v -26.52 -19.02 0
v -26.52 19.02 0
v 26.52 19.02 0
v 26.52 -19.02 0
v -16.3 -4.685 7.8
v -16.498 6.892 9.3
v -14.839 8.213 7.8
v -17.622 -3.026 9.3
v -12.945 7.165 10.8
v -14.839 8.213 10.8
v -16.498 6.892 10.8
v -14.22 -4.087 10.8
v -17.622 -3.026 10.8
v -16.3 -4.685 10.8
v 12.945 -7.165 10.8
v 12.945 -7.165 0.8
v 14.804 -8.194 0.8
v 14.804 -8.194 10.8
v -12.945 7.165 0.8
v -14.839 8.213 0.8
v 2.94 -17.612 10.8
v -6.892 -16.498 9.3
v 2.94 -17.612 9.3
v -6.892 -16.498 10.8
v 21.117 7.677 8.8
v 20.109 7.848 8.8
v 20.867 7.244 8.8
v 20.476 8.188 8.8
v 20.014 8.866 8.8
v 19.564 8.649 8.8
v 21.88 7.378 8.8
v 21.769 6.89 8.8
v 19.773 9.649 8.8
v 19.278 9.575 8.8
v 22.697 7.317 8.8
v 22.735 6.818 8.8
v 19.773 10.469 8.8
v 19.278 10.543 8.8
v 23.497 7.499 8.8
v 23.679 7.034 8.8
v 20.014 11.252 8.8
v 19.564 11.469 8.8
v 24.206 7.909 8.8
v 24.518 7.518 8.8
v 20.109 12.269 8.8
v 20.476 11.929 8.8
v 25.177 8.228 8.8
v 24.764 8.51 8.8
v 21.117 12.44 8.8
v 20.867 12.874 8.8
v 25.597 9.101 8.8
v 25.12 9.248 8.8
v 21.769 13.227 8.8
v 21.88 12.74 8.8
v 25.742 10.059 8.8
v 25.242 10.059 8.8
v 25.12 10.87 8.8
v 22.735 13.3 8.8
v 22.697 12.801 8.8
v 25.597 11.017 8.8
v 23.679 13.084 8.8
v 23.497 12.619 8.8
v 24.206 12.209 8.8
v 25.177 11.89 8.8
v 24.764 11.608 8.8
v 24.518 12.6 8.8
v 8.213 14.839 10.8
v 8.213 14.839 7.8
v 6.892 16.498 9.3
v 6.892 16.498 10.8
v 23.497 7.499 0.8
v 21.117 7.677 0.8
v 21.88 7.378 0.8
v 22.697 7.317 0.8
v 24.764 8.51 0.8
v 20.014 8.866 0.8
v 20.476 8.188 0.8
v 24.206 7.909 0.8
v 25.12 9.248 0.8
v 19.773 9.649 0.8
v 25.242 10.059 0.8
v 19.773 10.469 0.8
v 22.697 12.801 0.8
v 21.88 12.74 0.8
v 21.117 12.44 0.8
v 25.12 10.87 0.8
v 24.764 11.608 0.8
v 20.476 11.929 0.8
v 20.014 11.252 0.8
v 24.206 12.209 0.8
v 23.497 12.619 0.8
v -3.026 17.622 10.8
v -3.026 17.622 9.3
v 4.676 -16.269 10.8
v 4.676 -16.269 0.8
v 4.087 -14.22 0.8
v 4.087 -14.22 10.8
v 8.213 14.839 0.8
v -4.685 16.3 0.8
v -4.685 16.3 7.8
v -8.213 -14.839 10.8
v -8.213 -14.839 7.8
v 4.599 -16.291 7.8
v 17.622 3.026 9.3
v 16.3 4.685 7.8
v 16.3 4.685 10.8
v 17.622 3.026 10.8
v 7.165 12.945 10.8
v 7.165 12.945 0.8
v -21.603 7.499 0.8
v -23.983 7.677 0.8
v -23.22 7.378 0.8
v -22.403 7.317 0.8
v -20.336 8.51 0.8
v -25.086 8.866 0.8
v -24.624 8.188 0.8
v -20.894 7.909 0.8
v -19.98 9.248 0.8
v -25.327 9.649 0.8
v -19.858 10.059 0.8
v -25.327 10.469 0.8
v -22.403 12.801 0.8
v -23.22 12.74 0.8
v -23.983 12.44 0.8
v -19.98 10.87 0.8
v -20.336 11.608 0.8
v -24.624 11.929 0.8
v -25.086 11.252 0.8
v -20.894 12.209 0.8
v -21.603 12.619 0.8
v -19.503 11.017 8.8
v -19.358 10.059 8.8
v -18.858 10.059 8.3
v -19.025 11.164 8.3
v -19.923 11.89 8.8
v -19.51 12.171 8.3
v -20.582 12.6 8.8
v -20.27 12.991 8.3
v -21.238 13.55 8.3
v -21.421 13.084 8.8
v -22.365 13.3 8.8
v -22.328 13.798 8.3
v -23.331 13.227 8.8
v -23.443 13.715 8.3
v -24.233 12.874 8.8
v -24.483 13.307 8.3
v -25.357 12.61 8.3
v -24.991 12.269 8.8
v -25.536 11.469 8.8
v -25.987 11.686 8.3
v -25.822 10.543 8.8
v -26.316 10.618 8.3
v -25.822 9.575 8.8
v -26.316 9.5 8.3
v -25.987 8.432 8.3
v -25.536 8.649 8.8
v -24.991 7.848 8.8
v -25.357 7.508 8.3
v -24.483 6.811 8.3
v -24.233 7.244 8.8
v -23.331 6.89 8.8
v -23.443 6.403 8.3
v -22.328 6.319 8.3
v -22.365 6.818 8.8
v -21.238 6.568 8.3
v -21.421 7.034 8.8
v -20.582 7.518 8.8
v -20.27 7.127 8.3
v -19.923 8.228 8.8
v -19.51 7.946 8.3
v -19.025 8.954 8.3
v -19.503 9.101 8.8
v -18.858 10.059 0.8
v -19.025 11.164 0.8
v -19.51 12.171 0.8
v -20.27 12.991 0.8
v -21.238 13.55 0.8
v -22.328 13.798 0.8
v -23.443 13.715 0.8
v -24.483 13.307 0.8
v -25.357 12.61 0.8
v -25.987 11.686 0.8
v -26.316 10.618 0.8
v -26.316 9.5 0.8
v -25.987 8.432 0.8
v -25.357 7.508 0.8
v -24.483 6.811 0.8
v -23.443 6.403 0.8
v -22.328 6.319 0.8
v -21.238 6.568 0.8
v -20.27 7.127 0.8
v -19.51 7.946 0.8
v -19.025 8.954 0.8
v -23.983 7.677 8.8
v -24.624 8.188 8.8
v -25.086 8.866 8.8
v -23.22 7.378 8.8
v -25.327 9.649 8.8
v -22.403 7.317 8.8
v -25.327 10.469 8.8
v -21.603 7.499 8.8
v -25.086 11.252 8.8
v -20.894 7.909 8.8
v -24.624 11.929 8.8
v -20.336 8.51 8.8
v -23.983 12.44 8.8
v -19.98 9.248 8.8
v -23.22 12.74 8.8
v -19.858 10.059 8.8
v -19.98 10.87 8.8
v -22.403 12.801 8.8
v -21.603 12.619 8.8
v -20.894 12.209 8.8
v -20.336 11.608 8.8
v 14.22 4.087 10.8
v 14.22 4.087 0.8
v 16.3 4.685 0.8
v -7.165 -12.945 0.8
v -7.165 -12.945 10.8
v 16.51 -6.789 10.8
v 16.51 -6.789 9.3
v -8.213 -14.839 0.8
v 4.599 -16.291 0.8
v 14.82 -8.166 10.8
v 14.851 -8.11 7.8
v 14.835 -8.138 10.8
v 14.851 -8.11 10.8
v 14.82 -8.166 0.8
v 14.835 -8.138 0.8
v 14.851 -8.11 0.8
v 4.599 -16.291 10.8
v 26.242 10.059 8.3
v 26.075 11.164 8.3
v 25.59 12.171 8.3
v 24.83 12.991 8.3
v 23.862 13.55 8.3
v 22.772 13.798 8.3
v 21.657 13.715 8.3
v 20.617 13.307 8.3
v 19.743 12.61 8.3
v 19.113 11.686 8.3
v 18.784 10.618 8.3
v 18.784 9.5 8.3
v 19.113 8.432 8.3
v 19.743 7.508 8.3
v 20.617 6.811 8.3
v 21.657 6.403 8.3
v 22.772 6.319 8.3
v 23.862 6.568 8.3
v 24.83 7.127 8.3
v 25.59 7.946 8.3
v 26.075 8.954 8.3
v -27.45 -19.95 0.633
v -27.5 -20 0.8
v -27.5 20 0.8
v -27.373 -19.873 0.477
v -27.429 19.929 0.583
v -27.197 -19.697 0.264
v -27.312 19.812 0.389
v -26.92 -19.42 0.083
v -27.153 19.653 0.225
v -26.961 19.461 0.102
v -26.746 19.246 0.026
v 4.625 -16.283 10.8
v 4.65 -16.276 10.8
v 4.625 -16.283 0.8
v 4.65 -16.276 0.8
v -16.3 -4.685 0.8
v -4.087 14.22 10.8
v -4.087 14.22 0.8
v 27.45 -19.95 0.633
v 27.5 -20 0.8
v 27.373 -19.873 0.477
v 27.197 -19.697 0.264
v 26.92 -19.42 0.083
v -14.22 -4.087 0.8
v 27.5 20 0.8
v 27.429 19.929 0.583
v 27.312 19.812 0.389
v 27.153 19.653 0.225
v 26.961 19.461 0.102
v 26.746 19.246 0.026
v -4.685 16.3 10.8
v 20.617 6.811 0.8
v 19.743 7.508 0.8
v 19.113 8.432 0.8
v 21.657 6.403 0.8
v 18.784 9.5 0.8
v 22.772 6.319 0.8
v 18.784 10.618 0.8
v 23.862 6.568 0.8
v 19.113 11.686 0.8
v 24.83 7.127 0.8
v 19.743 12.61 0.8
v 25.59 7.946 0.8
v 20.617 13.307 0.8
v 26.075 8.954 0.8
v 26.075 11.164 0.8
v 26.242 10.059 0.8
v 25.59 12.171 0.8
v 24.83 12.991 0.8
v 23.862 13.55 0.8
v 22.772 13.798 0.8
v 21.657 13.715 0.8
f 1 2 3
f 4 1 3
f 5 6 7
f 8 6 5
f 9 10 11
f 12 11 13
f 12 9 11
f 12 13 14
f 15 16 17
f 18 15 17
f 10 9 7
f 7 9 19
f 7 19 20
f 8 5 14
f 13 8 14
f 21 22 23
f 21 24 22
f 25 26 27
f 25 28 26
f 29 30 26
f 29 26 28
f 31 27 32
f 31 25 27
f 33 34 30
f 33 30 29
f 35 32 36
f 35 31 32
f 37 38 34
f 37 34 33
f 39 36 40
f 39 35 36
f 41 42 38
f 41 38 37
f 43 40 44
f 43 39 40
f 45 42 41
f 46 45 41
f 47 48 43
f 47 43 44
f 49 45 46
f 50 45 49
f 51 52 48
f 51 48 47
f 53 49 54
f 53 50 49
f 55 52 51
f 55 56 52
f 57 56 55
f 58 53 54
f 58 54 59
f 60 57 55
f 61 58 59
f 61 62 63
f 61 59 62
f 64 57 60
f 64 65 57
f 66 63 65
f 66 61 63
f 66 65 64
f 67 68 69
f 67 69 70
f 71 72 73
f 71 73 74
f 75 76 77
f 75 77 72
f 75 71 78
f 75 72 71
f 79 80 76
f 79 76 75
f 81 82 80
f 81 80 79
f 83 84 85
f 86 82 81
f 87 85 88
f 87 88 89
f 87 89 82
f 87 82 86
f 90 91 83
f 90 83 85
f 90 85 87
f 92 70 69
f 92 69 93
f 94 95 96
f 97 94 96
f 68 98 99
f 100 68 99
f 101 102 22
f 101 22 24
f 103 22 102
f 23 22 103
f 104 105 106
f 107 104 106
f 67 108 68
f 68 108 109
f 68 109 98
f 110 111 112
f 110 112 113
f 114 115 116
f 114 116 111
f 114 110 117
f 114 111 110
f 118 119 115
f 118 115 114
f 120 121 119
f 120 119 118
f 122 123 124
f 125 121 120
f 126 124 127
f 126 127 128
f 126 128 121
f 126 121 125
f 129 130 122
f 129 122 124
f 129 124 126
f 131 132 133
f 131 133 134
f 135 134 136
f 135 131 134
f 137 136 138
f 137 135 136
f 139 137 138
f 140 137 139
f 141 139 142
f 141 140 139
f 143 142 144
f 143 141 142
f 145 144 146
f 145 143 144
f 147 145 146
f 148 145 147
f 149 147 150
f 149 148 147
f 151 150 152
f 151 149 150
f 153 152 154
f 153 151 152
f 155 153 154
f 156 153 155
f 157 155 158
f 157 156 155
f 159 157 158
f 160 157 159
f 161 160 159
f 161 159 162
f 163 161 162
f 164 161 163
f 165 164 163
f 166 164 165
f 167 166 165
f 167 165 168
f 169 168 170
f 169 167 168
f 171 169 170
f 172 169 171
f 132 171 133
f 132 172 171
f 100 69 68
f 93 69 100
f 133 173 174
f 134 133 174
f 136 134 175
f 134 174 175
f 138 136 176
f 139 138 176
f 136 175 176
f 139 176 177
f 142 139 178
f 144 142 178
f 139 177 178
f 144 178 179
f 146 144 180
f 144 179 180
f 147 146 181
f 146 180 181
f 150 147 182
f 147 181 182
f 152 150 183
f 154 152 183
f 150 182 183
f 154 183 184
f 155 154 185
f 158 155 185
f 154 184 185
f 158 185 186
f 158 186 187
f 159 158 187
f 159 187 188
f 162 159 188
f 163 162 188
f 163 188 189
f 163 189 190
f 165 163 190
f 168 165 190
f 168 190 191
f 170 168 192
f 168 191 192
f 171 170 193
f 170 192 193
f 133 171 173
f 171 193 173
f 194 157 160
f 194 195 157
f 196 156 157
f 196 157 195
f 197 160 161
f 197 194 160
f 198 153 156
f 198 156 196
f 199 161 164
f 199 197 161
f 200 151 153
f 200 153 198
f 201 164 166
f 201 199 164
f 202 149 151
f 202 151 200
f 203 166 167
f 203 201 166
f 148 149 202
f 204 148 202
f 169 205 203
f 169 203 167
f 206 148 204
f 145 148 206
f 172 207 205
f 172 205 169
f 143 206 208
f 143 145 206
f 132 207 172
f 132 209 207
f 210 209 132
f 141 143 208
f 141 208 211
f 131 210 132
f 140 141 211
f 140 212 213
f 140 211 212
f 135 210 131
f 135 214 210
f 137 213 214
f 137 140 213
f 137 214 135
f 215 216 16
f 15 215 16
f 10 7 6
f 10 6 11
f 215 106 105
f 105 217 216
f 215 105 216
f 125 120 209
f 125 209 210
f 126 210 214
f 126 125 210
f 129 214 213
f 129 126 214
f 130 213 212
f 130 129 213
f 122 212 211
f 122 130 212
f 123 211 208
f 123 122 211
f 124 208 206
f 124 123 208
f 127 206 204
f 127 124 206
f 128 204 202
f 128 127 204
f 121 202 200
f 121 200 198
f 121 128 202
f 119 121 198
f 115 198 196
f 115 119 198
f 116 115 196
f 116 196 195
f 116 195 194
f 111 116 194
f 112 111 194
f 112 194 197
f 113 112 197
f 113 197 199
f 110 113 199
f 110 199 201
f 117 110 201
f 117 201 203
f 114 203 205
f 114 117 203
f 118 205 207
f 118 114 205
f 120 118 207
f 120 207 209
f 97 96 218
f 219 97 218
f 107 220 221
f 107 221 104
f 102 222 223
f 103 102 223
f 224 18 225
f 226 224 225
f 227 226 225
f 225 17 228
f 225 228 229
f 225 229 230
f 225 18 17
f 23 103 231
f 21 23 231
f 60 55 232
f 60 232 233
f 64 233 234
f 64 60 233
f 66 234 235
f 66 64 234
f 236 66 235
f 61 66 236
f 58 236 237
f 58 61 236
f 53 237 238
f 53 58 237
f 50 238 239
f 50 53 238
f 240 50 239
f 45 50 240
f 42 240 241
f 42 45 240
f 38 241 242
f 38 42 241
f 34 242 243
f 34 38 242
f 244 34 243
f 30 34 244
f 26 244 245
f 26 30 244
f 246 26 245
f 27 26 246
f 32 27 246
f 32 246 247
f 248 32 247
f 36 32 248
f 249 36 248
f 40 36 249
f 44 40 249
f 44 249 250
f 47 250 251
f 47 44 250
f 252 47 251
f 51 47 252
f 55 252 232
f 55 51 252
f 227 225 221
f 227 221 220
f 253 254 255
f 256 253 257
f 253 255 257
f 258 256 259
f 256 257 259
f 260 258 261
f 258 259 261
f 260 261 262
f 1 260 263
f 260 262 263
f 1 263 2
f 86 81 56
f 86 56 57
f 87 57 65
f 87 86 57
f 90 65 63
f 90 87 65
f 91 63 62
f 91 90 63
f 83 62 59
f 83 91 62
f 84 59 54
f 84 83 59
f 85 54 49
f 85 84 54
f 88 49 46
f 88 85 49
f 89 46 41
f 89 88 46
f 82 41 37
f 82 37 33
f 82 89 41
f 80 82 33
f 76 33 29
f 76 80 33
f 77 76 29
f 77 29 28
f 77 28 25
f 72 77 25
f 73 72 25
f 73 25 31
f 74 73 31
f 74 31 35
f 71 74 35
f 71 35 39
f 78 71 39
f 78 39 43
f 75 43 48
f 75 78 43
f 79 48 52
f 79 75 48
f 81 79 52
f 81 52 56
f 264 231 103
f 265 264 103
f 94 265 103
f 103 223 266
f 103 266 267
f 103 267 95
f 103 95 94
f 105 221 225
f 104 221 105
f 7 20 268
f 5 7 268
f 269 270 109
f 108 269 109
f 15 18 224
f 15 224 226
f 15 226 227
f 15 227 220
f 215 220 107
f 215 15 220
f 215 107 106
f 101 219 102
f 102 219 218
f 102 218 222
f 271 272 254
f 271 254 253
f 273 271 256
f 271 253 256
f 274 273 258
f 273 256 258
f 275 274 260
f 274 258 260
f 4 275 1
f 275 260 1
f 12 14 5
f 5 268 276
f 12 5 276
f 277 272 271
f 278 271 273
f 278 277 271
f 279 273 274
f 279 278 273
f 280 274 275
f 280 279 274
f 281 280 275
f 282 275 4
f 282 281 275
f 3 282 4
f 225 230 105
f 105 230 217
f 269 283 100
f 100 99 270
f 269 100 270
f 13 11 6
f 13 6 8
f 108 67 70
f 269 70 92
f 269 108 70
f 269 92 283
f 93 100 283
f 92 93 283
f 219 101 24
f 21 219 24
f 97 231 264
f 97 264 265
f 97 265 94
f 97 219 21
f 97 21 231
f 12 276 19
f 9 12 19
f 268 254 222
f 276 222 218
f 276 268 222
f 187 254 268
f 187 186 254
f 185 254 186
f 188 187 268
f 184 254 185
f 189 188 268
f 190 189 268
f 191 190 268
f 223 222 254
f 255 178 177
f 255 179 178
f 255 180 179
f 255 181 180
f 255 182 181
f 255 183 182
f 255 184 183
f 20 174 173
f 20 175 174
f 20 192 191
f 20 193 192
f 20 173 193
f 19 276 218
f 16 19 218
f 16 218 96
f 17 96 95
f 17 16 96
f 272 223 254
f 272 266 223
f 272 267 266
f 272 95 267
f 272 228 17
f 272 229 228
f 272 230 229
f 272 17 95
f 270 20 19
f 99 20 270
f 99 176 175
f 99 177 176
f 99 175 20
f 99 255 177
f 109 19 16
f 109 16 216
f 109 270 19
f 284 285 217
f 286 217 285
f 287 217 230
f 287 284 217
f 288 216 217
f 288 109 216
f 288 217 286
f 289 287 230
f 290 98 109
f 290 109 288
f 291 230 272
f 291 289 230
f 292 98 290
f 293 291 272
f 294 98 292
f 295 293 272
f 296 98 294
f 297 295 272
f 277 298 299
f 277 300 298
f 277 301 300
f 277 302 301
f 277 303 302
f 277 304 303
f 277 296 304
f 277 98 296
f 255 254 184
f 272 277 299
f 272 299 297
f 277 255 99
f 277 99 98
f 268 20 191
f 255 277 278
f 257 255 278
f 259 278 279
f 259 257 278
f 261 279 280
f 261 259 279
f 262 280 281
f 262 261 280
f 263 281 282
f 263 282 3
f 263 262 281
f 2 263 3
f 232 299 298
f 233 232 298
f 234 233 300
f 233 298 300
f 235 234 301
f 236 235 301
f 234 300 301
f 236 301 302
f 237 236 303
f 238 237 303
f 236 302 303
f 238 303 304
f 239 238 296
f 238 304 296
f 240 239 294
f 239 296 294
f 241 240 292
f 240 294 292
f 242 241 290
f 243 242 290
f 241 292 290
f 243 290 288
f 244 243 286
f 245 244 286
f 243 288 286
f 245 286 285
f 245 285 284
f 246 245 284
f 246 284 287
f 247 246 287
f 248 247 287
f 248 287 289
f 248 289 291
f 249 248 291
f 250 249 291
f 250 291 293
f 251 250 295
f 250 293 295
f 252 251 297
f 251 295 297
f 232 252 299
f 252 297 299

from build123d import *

# Parameters (mm, degrees)
F0_W         = 55
F0_H         = 40
F1_DEPTH     = 0.8
F3_DEPTH     = 10
F2_R         = 3.75
F2_R_2       = 2.75
F4_DEPTH     = 8
F5_SIZE      = 0.5
F6_W         = 12.8945924119
F6_H         = 3
F7_DEPTH     = 1.5
F8_SIZE      = 1.49999
F9_SIZE      = 1.49999
F10_W        = 12.8768104754
F10_H        = 3
F11_DEPTH    = 1.5
F12_SIZE     = 1.49999
F13_W        = 12.9808257885
F13_H        = 3
F14_DEPTH    = 1.5
F15_SIZE     = 1.49999
F16_W        = 12.9808257885
F16_H        = 3
F17_DEPTH    = 1.5
F18_SIZE     = 1.49999
F19_T1_DEPTH = 59.8989794856
F19_T3_DEPTH = 44.8989794856


# Not quite as in the source:
# - a fillet or chamfer that OpenCascade refuses, or shapes differently, is made with other operations: its cross-section is extruded or revolved along the edge and cut away or added
# - a fillet or chamfer is up to 0.001 mm smaller than in the source, because OpenCascade refuses the exact size


with BuildPart() as f1:
    # F0 (on Top) → F1 (new body)
    with BuildSketch(Plane.XY):
        Rectangle(F0_W, F0_H)
    extrude(amount=F1_DEPTH)

    # F2 (on face) → F3 (join)
    with BuildSketch(Plane.XY.offset(0.8)):
        Polygon((7.1650690396, 12.9448085418), (8.2134181145, 14.8388137473), (-4.68486218, 16.3003894709), (-4.0868929955, 14.2198308067), align=None)
        with BuildLine():
            Line((-8.2134181145, -14.8388137473), (4.5991771643, -16.2906800263))
            ThreePointArc((4.5991771643, -16.2906800263), (4.6374749925, -16.2797221091), (4.6757470388, -16.268674482))
            Line((4.6757470388, -16.268674482), (4.0868929955, -14.2198308067))
            Line((4.0868929955, -14.2198308067), (-7.1650690396, -12.9448085418))
            Line((-7.1650690396, -12.9448085418), (-8.2134181145, -14.8388137473))
        make_face()
        Polygon((-14.8388137473, 8.2134181145), (-16.3003894709, -4.68486218), (-14.2198308067, -4.0868929955), (-12.9448085418, 7.1650690396), align=None)
        with BuildLine():
            Line((14.8505253486, -8.1100642381), (16.3003894709, 4.68486218))
            Line((16.3003894709, 4.68486218), (14.2198308067, 4.0868929955))
            Line((14.2198308067, 4.0868929955), (12.9448085418, -7.1650690396))
            Line((12.9448085418, -7.1650690396), (14.8041096105, -8.1942090597))
            ThreePointArc((14.8041096105, -8.1942090597), (14.8273769365, -8.1521694464), (14.8505253486, -8.1100642381))
        make_face()
    extrude(amount=F3_DEPTH)

    # F2 (on face) → F4 (join)
    with BuildSketch(Plane.XY.offset(0.8)):
        with Locations((22.4918836008, 10.0589259832)):
            Circle(F2_R)
        with Locations((22.4918836008, 10.0589259832)):
            Circle(F2_R_2, mode=Mode.SUBTRACT)
        with Locations((-22.6081163992, 10.0589259832)):
            Circle(F2_R)
        with Locations((-22.6081163992, 10.0589259832)):
            Circle(F2_R_2, mode=Mode.SUBTRACT)
    extrude(amount=F4_DEPTH)

    # F5
    f5_edges = [f1.edges().sort_by_distance(p)[0] for p in [
        (-26.358116, 10.058926, 8.8),
        (18.741884, 10.058926, 8.8),
    ]]
    chamfer(f5_edges, length=F5_SIZE)

    # F6 (on face) → F7 (join)
    with BuildSketch(Plane(origin=(-1.7642779672, -15.5696016091, 0), x_dir=(0.9936409674, -0.1125949726, 0), z_dir=(-0.1125949726, -0.9936409674, 0))):
        with Locations((-0.0431166883, 9.3)):
            Rectangle(F6_W, F6_H)
    extrude(amount=F7_DEPTH)

    # F8 (size 1.5 in the source; OpenCascade refuses exactly that, so slightly less here)
    f8_edges = [f1.edges().sort_by_distance(p)[0] for p in [
        (-1.976013, -17.055208, 7.8),
    ]]
    chamfer(f8_edges, length=F8_SIZE)

    # F9 (size 1.5 in the source; OpenCascade refuses exactly that, so slightly less here)
    f9_edges = [f1.edges().sort_by_distance(p)[0] for p in [
        (-8.382311, -16.329275, 10.049995),
        (4.430285, -17.781141, 10.049995),
    ]]
    chamfer(f9_edges, length=F9_SIZE)

    # F10 (on face) → F11 (join)
    with BuildSketch(Plane(origin=(15.5696016091, -1.7642779672, 0), x_dir=(0.1125949726, 0.9936409674, 0), z_dir=(0.9936409674, -0.1125949726, 0))):
        with Locations((0.0520076565, 9.3)):
            Rectangle(F10_W, F10_H)
    extrude(amount=F11_DEPTH)

    # F12 (size 1.5 in the source; OpenCascade refuses exactly that, so slightly less here)
    f12_edges = [f1.edges().sort_by_distance(p)[0] for p in [
        (17.065919, -1.881493, 7.8),
        (16.340987, -8.278957, 9.3),
        (17.790851, 4.51597, 9.3),
    ]]
    chamfer(f12_edges, length=F12_SIZE)

    # F13 (on face) → F14 (join)
    with BuildSketch(Plane(origin=(1.7642779672, 15.5696016091, 0), x_dir=(-0.9936409674, 0.1125949726, 0), z_dir=(0.1125949726, 0.9936409674, 0))):
        with Locations((0, 9.3)):
            Rectangle(F13_W, F13_H)
    extrude(amount=F14_DEPTH)

    # F15 (size 1.5 in the source; OpenCascade refuses exactly that, so slightly less here)
    f15_edges = [f1.edges().sort_by_distance(p)[0] for p in [
        (8.382311, 16.329275, 9.3),
        (1.93317, 17.060063, 7.8),
        (-4.51597, 17.790851, 9.3),
    ]]
    chamfer(f15_edges, length=F15_SIZE)

    # F16 (on face) → F17 (join)
    with BuildSketch(Plane(origin=(-15.5696016091, 1.7642779672, 0), x_dir=(-0.1125949726, -0.9936409674, 0), z_dir=(-0.9936409674, 0.1125949726, 0))):
        with Locations((0, 9.3)):
            Rectangle(F16_W, F16_H)
    extrude(amount=F17_DEPTH)

    # F18 (size 1.5 in the source; OpenCascade refuses exactly that, so slightly less here)
    f18_edges = [f1.edges().sort_by_distance(p)[0] for p in [
        (-16.329275, 8.382311, 9.3),
        (-17.060063, 1.93317, 7.8),
        (-17.790851, -4.51597, 9.3),
    ]]
    chamfer(f18_edges, length=F18_SIZE)

    # F19: fillet of radius 1 on 4 edges, made by hand

    # F19_s2 → F19_t1 (cut)
    with BuildSketch(Plane.YZ.offset(-29.9494897428)):
        with BuildLine():
            ThreePointArc((-20, 0.8), (-19.6526596349, 0.2254033308), (-19.0202041029, 0))
            Line((-19.0202041029, 0), (-20, 0))
            Line((-20, 0), (-20, 0.8))
        make_face()
        with BuildLine():
            ThreePointArc((20, 0.8), (19.6526596349, 0.2254033308), (19.0202041029, 0))
            Line((19.0202041029, 0), (20, 0))
            Line((20, 0), (20, 0.8))
        make_face()
    extrude(amount=F19_T1_DEPTH, mode=Mode.SUBTRACT)

    # F19_s4 → F19_t3 (cut)
    with BuildSketch(Plane.XZ.offset(-22.4494897428)):
        with BuildLine():
            ThreePointArc((27.5, 0.8), (27.1526596349, 0.2254033308), (26.5202041029, 0))
            Line((26.5202041029, 0), (27.5, 0))
            Line((27.5, 0), (27.5, 0.8))
        make_face()
        with BuildLine():
            ThreePointArc((-27.5, 0.8), (-27.1526596349, 0.2254033308), (-26.5202041029, 0))
            Line((-26.5202041029, 0), (-27.5, 0))
            Line((-27.5, 0), (-27.5, 0.8))
        make_face()
    extrude(amount=F19_T3_DEPTH, mode=Mode.SUBTRACT)


solid = f1.part
